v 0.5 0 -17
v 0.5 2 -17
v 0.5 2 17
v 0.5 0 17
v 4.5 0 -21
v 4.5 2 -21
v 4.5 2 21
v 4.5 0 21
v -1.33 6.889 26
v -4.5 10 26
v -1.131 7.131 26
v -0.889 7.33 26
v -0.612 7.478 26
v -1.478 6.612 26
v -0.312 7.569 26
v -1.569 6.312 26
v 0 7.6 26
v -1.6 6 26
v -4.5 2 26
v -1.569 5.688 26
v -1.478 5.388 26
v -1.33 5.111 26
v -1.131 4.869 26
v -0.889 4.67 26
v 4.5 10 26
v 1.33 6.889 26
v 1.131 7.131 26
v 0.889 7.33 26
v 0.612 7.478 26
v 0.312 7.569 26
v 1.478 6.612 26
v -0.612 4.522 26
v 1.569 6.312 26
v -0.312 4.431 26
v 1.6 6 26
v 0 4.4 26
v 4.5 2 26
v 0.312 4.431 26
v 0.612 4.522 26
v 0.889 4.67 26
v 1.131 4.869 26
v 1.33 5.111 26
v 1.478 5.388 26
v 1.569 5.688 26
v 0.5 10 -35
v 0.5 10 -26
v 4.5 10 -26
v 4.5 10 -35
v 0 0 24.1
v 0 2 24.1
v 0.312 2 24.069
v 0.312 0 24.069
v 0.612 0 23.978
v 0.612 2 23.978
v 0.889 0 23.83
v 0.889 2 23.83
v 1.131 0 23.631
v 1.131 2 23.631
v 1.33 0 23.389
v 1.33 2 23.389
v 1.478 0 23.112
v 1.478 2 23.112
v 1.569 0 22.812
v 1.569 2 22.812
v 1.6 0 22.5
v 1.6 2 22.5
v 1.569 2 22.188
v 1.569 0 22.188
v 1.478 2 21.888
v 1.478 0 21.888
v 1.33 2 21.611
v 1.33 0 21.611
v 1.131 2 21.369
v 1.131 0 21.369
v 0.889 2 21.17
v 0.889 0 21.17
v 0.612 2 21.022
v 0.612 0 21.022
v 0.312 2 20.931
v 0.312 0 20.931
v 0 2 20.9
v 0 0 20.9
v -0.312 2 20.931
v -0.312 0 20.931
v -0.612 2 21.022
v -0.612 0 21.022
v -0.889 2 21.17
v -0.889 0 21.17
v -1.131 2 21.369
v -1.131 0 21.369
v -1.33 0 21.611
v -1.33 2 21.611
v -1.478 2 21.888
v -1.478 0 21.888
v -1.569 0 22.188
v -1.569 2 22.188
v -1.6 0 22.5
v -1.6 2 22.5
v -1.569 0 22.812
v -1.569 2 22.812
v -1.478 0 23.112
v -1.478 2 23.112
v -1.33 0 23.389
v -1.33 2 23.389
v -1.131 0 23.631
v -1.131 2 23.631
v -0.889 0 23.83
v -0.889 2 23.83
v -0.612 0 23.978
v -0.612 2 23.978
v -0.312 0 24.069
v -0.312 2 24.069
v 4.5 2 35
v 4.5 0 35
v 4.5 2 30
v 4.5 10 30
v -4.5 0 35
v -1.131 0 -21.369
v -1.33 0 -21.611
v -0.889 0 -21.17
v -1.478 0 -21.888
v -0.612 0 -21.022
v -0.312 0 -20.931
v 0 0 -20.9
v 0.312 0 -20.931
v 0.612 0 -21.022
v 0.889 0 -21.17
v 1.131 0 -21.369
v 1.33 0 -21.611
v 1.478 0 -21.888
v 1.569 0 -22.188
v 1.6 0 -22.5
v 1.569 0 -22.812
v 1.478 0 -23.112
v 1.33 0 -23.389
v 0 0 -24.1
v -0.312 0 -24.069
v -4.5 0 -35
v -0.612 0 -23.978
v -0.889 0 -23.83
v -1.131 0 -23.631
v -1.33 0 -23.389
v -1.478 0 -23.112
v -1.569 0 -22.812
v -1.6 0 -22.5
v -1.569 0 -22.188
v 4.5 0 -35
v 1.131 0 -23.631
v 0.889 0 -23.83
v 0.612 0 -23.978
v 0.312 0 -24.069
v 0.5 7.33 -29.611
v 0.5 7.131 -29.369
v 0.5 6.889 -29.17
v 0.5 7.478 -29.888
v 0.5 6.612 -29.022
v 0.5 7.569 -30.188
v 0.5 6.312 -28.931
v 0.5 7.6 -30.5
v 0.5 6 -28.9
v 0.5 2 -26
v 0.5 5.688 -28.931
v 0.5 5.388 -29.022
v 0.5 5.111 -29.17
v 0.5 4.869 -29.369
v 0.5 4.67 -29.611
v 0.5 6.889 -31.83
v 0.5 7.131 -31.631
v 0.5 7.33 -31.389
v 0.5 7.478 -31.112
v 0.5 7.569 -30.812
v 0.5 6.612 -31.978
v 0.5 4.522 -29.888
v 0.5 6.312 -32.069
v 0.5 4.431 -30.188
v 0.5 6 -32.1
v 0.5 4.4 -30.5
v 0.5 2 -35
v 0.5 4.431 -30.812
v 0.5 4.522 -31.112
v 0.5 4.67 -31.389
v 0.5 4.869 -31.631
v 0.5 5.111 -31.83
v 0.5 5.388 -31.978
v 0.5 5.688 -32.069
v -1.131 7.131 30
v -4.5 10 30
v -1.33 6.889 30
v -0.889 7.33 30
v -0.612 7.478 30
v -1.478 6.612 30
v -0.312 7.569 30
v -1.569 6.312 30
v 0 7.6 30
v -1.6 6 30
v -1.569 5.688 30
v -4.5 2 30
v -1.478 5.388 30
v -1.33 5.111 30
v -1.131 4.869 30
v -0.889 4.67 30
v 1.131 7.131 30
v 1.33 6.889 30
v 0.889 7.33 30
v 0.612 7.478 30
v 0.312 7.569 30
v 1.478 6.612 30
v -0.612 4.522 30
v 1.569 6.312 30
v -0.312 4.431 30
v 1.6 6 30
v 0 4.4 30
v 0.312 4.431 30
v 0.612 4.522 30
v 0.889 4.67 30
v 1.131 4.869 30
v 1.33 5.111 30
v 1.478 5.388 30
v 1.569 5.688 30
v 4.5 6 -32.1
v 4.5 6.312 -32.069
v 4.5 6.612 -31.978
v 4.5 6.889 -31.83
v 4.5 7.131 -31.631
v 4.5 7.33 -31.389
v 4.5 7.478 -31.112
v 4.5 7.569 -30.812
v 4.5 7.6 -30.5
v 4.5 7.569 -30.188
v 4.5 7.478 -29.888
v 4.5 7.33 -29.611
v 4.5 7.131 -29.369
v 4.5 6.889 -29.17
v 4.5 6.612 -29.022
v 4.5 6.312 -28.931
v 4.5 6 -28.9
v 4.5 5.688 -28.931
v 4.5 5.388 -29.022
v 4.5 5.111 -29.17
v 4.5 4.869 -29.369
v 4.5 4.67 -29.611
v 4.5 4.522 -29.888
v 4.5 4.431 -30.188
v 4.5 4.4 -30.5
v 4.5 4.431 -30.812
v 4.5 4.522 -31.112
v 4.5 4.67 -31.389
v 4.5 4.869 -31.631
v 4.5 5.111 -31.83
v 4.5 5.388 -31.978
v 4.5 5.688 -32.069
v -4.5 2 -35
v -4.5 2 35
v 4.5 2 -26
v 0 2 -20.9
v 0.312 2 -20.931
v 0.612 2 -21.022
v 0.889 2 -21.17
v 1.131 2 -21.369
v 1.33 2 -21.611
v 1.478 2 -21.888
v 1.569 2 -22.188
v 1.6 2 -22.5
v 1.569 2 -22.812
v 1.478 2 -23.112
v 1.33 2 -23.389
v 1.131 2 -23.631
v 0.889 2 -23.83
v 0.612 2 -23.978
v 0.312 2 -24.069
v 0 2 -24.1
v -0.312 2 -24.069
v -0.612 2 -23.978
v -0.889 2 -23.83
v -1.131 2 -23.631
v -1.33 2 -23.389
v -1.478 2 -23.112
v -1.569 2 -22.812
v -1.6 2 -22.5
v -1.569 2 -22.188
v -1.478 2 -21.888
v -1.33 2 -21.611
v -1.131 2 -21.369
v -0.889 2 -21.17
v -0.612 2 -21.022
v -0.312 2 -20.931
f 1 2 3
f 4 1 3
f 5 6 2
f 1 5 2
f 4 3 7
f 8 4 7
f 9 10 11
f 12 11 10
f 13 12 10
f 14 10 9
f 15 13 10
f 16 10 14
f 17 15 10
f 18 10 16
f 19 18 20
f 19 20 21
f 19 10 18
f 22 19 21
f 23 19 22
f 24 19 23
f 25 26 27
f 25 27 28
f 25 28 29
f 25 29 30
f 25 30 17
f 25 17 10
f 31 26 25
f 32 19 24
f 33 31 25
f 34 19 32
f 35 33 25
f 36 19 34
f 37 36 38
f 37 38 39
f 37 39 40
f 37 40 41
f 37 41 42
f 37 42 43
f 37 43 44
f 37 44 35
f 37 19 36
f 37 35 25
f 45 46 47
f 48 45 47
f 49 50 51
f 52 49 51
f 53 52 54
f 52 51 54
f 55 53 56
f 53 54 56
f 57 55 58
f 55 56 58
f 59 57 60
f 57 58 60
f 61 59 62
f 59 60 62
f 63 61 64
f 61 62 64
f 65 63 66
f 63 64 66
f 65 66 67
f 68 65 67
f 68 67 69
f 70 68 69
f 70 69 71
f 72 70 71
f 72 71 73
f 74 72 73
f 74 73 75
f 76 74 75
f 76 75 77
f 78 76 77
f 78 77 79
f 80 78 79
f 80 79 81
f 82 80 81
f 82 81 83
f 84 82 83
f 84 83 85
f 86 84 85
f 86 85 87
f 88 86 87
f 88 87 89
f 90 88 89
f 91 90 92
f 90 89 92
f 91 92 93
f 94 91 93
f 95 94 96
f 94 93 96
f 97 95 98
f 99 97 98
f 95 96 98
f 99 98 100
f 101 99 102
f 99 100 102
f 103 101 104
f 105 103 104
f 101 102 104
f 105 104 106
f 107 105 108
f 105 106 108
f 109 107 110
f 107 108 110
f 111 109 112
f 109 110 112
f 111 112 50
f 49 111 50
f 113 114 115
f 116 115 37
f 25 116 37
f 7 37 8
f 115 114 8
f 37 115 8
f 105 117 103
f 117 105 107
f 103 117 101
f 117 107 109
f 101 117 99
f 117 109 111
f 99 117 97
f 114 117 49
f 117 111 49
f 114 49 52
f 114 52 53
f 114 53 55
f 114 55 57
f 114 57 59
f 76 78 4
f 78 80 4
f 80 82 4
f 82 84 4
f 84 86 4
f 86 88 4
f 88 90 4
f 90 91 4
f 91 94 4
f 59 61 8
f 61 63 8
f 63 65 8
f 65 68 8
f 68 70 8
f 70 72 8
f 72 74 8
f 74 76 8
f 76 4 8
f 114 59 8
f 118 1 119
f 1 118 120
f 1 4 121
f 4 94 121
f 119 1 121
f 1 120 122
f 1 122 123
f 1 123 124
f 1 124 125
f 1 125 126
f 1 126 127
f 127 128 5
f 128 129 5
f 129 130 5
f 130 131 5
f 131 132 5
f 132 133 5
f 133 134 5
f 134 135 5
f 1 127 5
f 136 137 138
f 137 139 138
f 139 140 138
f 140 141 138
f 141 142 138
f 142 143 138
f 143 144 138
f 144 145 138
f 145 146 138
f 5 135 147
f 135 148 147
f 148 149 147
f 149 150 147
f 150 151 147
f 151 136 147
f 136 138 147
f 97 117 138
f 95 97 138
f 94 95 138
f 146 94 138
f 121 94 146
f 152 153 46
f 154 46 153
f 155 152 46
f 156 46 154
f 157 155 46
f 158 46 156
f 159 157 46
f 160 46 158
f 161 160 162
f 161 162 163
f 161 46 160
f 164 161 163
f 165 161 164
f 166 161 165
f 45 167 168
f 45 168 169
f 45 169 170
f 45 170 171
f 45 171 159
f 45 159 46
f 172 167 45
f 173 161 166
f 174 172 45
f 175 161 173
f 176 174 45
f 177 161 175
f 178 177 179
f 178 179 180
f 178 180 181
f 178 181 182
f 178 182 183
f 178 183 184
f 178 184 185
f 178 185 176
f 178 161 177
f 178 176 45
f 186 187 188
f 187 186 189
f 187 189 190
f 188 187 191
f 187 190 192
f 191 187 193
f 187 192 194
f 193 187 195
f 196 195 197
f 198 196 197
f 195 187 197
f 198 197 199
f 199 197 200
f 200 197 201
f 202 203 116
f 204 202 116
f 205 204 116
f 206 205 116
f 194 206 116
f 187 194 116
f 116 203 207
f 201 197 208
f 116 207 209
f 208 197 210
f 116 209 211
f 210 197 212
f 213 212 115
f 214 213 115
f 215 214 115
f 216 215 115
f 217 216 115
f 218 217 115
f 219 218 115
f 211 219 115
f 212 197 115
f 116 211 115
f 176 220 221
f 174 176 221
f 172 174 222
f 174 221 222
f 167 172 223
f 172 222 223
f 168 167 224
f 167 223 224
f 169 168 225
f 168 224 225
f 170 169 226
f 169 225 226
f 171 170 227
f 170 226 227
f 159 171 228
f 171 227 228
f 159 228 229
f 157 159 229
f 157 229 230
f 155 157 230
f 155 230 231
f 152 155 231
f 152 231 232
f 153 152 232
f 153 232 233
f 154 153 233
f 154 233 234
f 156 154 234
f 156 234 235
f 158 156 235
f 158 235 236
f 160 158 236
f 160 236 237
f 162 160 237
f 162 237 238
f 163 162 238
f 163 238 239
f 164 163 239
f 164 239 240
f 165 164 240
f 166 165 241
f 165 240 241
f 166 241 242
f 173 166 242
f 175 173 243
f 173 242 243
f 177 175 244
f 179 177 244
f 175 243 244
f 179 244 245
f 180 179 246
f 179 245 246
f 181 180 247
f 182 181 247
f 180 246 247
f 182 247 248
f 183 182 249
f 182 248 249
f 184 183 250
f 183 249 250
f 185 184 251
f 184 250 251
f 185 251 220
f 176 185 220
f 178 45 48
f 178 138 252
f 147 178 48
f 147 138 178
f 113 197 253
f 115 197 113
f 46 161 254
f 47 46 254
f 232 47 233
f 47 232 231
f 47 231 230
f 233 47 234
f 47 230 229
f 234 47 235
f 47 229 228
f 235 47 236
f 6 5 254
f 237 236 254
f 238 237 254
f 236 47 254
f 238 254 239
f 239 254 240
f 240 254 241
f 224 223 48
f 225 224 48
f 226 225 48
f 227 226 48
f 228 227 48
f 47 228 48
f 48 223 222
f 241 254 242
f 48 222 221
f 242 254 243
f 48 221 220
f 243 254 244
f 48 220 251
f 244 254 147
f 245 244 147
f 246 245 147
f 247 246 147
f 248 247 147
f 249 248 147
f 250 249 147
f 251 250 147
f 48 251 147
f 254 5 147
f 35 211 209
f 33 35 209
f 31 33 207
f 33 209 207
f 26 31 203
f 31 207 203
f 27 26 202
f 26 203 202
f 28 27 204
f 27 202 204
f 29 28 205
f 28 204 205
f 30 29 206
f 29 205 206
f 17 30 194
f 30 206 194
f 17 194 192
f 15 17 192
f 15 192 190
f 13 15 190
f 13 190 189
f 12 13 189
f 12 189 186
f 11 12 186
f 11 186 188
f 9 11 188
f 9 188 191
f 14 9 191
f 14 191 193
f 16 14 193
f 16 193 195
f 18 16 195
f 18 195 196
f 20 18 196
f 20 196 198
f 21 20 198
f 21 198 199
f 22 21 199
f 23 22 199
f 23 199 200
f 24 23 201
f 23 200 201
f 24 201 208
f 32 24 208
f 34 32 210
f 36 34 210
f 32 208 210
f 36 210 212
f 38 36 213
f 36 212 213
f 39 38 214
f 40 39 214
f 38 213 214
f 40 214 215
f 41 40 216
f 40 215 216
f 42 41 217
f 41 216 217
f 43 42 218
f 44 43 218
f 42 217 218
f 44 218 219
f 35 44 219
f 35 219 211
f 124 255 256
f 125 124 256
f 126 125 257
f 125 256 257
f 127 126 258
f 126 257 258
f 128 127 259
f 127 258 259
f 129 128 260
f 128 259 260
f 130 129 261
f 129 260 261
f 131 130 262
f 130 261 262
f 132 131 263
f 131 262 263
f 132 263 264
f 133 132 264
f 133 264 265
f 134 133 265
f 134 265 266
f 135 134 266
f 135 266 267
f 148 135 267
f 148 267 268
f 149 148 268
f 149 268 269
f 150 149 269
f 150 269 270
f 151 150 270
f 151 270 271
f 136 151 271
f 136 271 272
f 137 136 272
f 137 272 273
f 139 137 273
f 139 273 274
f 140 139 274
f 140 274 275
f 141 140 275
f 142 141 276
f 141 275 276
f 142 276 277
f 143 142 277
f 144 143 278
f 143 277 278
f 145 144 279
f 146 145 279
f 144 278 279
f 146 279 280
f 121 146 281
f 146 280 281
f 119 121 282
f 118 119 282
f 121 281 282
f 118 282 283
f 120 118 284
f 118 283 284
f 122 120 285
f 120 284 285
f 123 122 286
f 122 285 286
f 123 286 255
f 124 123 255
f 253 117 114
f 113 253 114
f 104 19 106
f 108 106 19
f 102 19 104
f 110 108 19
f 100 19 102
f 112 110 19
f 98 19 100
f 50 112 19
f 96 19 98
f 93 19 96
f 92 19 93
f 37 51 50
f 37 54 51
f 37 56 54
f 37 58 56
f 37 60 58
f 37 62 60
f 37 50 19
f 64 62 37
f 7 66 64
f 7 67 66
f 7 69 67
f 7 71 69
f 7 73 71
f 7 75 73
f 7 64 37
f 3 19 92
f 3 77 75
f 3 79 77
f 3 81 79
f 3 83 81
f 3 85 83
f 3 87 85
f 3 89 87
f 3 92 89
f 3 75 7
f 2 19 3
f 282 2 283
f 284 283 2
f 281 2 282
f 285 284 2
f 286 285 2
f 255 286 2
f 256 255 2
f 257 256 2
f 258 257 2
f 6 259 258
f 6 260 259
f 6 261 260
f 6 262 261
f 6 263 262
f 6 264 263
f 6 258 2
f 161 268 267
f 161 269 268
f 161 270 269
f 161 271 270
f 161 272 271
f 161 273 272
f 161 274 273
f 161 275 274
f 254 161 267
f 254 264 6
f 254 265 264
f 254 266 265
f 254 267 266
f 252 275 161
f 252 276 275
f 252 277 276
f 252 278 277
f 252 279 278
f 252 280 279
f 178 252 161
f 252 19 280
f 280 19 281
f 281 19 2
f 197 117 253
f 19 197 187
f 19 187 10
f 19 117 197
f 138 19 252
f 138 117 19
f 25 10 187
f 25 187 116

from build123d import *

# Parameters (mm, degrees)
ESBO_O6_W                = 9
ESBO_O6_H                = 70
RESSALTO_EXTRUS_O5_DEPTH = 2
ESBO_O7_W                = 9
ESBO_O7_H                = 4
ESBO_O7_W_2              = 4
ESBO_O7_H_2              = 9
RESSALTO_EXTRUS_O6_DEPTH = 8
ESBO_O8_R                = 1.6
CORTE_EXTRUS_O4_DEPTH    = 5
ESBO_O9_R                = 1.6
CORTE_EXTRUS_O5_DEPTH    = 5
CORTE_EXTRUS_O8_DEPTH    = 37.183559803
ESBO_O12_R               = 1.6
CORTE_EXTRUS_O9_DEPTH    = 5


with BuildPart() as part:
    # Esboço6 → Ressalto-extrusão5 (new body)
    with BuildSketch(Plane(origin=(0, 0, 0), x_dir=(1, 0, 0), z_dir=(0, 1, 0))):
        Rectangle(ESBO_O6_W, ESBO_O6_H)
    extrude(amount=RESSALTO_EXTRUS_O5_DEPTH)

    # Esboço7 → Ressalto-extrusão6 (add)
    with BuildSketch(Plane(origin=(0, 2, 0), x_dir=(1, 0, 0), z_dir=(0, 1, 0))):
        with Locations((0, -28)):
            Rectangle(ESBO_O7_W, ESBO_O7_H)
        with Locations((2.5, 30.5)):
            Rectangle(ESBO_O7_W_2, ESBO_O7_H_2)
    extrude(amount=RESSALTO_EXTRUS_O6_DEPTH)

    # Esboço8 → Corte-extrusão4 (cut)
    with BuildSketch(Plane.XY.offset(30)):
        with Locations((0, 6)):
            Circle(ESBO_O8_R)
    extrude(amount=-CORTE_EXTRUS_O4_DEPTH, mode=Mode.SUBTRACT)

    # Esboço9 → Corte-extrusão5 (cut)
    with BuildSketch(Plane(origin=(4.5, 0, 0), x_dir=(0, 0, -1), z_dir=(1, 0, 0))):
        with Locations((30.5, 6)):
            Circle(ESBO_O9_R)
    extrude(amount=-CORTE_EXTRUS_O5_DEPTH, mode=Mode.SUBTRACT)

    # Esboço10 → Corte-extrusão8 (cut, through all)
    with BuildSketch(Plane(origin=(0, 2, 0), x_dir=(1, 0, 0), z_dir=(0, 1, 0))):
        Polygon((4.5, 21), (0.5, 17), (0.5, -17), (4.5, -21), align=None)
    extrude(amount=-CORTE_EXTRUS_O8_DEPTH, mode=Mode.SUBTRACT)

    # Esboço12 → Corte-extrusão9 (cut)
    with BuildSketch(Plane(origin=(0, 2, 0), x_dir=(1, 0, 0), z_dir=(0, 1, 0))):
        with Locations(Location((0, 22.5, 0), (0, 0, 270))):
            Circle(ESBO_O12_R)
        with Locations(Location((0, -22.5, 0), (0, 0, 270))):
            Circle(ESBO_O12_R)
    extrude(amount=-CORTE_EXTRUS_O9_DEPTH, mode=Mode.SUBTRACT)


solid = part.part
